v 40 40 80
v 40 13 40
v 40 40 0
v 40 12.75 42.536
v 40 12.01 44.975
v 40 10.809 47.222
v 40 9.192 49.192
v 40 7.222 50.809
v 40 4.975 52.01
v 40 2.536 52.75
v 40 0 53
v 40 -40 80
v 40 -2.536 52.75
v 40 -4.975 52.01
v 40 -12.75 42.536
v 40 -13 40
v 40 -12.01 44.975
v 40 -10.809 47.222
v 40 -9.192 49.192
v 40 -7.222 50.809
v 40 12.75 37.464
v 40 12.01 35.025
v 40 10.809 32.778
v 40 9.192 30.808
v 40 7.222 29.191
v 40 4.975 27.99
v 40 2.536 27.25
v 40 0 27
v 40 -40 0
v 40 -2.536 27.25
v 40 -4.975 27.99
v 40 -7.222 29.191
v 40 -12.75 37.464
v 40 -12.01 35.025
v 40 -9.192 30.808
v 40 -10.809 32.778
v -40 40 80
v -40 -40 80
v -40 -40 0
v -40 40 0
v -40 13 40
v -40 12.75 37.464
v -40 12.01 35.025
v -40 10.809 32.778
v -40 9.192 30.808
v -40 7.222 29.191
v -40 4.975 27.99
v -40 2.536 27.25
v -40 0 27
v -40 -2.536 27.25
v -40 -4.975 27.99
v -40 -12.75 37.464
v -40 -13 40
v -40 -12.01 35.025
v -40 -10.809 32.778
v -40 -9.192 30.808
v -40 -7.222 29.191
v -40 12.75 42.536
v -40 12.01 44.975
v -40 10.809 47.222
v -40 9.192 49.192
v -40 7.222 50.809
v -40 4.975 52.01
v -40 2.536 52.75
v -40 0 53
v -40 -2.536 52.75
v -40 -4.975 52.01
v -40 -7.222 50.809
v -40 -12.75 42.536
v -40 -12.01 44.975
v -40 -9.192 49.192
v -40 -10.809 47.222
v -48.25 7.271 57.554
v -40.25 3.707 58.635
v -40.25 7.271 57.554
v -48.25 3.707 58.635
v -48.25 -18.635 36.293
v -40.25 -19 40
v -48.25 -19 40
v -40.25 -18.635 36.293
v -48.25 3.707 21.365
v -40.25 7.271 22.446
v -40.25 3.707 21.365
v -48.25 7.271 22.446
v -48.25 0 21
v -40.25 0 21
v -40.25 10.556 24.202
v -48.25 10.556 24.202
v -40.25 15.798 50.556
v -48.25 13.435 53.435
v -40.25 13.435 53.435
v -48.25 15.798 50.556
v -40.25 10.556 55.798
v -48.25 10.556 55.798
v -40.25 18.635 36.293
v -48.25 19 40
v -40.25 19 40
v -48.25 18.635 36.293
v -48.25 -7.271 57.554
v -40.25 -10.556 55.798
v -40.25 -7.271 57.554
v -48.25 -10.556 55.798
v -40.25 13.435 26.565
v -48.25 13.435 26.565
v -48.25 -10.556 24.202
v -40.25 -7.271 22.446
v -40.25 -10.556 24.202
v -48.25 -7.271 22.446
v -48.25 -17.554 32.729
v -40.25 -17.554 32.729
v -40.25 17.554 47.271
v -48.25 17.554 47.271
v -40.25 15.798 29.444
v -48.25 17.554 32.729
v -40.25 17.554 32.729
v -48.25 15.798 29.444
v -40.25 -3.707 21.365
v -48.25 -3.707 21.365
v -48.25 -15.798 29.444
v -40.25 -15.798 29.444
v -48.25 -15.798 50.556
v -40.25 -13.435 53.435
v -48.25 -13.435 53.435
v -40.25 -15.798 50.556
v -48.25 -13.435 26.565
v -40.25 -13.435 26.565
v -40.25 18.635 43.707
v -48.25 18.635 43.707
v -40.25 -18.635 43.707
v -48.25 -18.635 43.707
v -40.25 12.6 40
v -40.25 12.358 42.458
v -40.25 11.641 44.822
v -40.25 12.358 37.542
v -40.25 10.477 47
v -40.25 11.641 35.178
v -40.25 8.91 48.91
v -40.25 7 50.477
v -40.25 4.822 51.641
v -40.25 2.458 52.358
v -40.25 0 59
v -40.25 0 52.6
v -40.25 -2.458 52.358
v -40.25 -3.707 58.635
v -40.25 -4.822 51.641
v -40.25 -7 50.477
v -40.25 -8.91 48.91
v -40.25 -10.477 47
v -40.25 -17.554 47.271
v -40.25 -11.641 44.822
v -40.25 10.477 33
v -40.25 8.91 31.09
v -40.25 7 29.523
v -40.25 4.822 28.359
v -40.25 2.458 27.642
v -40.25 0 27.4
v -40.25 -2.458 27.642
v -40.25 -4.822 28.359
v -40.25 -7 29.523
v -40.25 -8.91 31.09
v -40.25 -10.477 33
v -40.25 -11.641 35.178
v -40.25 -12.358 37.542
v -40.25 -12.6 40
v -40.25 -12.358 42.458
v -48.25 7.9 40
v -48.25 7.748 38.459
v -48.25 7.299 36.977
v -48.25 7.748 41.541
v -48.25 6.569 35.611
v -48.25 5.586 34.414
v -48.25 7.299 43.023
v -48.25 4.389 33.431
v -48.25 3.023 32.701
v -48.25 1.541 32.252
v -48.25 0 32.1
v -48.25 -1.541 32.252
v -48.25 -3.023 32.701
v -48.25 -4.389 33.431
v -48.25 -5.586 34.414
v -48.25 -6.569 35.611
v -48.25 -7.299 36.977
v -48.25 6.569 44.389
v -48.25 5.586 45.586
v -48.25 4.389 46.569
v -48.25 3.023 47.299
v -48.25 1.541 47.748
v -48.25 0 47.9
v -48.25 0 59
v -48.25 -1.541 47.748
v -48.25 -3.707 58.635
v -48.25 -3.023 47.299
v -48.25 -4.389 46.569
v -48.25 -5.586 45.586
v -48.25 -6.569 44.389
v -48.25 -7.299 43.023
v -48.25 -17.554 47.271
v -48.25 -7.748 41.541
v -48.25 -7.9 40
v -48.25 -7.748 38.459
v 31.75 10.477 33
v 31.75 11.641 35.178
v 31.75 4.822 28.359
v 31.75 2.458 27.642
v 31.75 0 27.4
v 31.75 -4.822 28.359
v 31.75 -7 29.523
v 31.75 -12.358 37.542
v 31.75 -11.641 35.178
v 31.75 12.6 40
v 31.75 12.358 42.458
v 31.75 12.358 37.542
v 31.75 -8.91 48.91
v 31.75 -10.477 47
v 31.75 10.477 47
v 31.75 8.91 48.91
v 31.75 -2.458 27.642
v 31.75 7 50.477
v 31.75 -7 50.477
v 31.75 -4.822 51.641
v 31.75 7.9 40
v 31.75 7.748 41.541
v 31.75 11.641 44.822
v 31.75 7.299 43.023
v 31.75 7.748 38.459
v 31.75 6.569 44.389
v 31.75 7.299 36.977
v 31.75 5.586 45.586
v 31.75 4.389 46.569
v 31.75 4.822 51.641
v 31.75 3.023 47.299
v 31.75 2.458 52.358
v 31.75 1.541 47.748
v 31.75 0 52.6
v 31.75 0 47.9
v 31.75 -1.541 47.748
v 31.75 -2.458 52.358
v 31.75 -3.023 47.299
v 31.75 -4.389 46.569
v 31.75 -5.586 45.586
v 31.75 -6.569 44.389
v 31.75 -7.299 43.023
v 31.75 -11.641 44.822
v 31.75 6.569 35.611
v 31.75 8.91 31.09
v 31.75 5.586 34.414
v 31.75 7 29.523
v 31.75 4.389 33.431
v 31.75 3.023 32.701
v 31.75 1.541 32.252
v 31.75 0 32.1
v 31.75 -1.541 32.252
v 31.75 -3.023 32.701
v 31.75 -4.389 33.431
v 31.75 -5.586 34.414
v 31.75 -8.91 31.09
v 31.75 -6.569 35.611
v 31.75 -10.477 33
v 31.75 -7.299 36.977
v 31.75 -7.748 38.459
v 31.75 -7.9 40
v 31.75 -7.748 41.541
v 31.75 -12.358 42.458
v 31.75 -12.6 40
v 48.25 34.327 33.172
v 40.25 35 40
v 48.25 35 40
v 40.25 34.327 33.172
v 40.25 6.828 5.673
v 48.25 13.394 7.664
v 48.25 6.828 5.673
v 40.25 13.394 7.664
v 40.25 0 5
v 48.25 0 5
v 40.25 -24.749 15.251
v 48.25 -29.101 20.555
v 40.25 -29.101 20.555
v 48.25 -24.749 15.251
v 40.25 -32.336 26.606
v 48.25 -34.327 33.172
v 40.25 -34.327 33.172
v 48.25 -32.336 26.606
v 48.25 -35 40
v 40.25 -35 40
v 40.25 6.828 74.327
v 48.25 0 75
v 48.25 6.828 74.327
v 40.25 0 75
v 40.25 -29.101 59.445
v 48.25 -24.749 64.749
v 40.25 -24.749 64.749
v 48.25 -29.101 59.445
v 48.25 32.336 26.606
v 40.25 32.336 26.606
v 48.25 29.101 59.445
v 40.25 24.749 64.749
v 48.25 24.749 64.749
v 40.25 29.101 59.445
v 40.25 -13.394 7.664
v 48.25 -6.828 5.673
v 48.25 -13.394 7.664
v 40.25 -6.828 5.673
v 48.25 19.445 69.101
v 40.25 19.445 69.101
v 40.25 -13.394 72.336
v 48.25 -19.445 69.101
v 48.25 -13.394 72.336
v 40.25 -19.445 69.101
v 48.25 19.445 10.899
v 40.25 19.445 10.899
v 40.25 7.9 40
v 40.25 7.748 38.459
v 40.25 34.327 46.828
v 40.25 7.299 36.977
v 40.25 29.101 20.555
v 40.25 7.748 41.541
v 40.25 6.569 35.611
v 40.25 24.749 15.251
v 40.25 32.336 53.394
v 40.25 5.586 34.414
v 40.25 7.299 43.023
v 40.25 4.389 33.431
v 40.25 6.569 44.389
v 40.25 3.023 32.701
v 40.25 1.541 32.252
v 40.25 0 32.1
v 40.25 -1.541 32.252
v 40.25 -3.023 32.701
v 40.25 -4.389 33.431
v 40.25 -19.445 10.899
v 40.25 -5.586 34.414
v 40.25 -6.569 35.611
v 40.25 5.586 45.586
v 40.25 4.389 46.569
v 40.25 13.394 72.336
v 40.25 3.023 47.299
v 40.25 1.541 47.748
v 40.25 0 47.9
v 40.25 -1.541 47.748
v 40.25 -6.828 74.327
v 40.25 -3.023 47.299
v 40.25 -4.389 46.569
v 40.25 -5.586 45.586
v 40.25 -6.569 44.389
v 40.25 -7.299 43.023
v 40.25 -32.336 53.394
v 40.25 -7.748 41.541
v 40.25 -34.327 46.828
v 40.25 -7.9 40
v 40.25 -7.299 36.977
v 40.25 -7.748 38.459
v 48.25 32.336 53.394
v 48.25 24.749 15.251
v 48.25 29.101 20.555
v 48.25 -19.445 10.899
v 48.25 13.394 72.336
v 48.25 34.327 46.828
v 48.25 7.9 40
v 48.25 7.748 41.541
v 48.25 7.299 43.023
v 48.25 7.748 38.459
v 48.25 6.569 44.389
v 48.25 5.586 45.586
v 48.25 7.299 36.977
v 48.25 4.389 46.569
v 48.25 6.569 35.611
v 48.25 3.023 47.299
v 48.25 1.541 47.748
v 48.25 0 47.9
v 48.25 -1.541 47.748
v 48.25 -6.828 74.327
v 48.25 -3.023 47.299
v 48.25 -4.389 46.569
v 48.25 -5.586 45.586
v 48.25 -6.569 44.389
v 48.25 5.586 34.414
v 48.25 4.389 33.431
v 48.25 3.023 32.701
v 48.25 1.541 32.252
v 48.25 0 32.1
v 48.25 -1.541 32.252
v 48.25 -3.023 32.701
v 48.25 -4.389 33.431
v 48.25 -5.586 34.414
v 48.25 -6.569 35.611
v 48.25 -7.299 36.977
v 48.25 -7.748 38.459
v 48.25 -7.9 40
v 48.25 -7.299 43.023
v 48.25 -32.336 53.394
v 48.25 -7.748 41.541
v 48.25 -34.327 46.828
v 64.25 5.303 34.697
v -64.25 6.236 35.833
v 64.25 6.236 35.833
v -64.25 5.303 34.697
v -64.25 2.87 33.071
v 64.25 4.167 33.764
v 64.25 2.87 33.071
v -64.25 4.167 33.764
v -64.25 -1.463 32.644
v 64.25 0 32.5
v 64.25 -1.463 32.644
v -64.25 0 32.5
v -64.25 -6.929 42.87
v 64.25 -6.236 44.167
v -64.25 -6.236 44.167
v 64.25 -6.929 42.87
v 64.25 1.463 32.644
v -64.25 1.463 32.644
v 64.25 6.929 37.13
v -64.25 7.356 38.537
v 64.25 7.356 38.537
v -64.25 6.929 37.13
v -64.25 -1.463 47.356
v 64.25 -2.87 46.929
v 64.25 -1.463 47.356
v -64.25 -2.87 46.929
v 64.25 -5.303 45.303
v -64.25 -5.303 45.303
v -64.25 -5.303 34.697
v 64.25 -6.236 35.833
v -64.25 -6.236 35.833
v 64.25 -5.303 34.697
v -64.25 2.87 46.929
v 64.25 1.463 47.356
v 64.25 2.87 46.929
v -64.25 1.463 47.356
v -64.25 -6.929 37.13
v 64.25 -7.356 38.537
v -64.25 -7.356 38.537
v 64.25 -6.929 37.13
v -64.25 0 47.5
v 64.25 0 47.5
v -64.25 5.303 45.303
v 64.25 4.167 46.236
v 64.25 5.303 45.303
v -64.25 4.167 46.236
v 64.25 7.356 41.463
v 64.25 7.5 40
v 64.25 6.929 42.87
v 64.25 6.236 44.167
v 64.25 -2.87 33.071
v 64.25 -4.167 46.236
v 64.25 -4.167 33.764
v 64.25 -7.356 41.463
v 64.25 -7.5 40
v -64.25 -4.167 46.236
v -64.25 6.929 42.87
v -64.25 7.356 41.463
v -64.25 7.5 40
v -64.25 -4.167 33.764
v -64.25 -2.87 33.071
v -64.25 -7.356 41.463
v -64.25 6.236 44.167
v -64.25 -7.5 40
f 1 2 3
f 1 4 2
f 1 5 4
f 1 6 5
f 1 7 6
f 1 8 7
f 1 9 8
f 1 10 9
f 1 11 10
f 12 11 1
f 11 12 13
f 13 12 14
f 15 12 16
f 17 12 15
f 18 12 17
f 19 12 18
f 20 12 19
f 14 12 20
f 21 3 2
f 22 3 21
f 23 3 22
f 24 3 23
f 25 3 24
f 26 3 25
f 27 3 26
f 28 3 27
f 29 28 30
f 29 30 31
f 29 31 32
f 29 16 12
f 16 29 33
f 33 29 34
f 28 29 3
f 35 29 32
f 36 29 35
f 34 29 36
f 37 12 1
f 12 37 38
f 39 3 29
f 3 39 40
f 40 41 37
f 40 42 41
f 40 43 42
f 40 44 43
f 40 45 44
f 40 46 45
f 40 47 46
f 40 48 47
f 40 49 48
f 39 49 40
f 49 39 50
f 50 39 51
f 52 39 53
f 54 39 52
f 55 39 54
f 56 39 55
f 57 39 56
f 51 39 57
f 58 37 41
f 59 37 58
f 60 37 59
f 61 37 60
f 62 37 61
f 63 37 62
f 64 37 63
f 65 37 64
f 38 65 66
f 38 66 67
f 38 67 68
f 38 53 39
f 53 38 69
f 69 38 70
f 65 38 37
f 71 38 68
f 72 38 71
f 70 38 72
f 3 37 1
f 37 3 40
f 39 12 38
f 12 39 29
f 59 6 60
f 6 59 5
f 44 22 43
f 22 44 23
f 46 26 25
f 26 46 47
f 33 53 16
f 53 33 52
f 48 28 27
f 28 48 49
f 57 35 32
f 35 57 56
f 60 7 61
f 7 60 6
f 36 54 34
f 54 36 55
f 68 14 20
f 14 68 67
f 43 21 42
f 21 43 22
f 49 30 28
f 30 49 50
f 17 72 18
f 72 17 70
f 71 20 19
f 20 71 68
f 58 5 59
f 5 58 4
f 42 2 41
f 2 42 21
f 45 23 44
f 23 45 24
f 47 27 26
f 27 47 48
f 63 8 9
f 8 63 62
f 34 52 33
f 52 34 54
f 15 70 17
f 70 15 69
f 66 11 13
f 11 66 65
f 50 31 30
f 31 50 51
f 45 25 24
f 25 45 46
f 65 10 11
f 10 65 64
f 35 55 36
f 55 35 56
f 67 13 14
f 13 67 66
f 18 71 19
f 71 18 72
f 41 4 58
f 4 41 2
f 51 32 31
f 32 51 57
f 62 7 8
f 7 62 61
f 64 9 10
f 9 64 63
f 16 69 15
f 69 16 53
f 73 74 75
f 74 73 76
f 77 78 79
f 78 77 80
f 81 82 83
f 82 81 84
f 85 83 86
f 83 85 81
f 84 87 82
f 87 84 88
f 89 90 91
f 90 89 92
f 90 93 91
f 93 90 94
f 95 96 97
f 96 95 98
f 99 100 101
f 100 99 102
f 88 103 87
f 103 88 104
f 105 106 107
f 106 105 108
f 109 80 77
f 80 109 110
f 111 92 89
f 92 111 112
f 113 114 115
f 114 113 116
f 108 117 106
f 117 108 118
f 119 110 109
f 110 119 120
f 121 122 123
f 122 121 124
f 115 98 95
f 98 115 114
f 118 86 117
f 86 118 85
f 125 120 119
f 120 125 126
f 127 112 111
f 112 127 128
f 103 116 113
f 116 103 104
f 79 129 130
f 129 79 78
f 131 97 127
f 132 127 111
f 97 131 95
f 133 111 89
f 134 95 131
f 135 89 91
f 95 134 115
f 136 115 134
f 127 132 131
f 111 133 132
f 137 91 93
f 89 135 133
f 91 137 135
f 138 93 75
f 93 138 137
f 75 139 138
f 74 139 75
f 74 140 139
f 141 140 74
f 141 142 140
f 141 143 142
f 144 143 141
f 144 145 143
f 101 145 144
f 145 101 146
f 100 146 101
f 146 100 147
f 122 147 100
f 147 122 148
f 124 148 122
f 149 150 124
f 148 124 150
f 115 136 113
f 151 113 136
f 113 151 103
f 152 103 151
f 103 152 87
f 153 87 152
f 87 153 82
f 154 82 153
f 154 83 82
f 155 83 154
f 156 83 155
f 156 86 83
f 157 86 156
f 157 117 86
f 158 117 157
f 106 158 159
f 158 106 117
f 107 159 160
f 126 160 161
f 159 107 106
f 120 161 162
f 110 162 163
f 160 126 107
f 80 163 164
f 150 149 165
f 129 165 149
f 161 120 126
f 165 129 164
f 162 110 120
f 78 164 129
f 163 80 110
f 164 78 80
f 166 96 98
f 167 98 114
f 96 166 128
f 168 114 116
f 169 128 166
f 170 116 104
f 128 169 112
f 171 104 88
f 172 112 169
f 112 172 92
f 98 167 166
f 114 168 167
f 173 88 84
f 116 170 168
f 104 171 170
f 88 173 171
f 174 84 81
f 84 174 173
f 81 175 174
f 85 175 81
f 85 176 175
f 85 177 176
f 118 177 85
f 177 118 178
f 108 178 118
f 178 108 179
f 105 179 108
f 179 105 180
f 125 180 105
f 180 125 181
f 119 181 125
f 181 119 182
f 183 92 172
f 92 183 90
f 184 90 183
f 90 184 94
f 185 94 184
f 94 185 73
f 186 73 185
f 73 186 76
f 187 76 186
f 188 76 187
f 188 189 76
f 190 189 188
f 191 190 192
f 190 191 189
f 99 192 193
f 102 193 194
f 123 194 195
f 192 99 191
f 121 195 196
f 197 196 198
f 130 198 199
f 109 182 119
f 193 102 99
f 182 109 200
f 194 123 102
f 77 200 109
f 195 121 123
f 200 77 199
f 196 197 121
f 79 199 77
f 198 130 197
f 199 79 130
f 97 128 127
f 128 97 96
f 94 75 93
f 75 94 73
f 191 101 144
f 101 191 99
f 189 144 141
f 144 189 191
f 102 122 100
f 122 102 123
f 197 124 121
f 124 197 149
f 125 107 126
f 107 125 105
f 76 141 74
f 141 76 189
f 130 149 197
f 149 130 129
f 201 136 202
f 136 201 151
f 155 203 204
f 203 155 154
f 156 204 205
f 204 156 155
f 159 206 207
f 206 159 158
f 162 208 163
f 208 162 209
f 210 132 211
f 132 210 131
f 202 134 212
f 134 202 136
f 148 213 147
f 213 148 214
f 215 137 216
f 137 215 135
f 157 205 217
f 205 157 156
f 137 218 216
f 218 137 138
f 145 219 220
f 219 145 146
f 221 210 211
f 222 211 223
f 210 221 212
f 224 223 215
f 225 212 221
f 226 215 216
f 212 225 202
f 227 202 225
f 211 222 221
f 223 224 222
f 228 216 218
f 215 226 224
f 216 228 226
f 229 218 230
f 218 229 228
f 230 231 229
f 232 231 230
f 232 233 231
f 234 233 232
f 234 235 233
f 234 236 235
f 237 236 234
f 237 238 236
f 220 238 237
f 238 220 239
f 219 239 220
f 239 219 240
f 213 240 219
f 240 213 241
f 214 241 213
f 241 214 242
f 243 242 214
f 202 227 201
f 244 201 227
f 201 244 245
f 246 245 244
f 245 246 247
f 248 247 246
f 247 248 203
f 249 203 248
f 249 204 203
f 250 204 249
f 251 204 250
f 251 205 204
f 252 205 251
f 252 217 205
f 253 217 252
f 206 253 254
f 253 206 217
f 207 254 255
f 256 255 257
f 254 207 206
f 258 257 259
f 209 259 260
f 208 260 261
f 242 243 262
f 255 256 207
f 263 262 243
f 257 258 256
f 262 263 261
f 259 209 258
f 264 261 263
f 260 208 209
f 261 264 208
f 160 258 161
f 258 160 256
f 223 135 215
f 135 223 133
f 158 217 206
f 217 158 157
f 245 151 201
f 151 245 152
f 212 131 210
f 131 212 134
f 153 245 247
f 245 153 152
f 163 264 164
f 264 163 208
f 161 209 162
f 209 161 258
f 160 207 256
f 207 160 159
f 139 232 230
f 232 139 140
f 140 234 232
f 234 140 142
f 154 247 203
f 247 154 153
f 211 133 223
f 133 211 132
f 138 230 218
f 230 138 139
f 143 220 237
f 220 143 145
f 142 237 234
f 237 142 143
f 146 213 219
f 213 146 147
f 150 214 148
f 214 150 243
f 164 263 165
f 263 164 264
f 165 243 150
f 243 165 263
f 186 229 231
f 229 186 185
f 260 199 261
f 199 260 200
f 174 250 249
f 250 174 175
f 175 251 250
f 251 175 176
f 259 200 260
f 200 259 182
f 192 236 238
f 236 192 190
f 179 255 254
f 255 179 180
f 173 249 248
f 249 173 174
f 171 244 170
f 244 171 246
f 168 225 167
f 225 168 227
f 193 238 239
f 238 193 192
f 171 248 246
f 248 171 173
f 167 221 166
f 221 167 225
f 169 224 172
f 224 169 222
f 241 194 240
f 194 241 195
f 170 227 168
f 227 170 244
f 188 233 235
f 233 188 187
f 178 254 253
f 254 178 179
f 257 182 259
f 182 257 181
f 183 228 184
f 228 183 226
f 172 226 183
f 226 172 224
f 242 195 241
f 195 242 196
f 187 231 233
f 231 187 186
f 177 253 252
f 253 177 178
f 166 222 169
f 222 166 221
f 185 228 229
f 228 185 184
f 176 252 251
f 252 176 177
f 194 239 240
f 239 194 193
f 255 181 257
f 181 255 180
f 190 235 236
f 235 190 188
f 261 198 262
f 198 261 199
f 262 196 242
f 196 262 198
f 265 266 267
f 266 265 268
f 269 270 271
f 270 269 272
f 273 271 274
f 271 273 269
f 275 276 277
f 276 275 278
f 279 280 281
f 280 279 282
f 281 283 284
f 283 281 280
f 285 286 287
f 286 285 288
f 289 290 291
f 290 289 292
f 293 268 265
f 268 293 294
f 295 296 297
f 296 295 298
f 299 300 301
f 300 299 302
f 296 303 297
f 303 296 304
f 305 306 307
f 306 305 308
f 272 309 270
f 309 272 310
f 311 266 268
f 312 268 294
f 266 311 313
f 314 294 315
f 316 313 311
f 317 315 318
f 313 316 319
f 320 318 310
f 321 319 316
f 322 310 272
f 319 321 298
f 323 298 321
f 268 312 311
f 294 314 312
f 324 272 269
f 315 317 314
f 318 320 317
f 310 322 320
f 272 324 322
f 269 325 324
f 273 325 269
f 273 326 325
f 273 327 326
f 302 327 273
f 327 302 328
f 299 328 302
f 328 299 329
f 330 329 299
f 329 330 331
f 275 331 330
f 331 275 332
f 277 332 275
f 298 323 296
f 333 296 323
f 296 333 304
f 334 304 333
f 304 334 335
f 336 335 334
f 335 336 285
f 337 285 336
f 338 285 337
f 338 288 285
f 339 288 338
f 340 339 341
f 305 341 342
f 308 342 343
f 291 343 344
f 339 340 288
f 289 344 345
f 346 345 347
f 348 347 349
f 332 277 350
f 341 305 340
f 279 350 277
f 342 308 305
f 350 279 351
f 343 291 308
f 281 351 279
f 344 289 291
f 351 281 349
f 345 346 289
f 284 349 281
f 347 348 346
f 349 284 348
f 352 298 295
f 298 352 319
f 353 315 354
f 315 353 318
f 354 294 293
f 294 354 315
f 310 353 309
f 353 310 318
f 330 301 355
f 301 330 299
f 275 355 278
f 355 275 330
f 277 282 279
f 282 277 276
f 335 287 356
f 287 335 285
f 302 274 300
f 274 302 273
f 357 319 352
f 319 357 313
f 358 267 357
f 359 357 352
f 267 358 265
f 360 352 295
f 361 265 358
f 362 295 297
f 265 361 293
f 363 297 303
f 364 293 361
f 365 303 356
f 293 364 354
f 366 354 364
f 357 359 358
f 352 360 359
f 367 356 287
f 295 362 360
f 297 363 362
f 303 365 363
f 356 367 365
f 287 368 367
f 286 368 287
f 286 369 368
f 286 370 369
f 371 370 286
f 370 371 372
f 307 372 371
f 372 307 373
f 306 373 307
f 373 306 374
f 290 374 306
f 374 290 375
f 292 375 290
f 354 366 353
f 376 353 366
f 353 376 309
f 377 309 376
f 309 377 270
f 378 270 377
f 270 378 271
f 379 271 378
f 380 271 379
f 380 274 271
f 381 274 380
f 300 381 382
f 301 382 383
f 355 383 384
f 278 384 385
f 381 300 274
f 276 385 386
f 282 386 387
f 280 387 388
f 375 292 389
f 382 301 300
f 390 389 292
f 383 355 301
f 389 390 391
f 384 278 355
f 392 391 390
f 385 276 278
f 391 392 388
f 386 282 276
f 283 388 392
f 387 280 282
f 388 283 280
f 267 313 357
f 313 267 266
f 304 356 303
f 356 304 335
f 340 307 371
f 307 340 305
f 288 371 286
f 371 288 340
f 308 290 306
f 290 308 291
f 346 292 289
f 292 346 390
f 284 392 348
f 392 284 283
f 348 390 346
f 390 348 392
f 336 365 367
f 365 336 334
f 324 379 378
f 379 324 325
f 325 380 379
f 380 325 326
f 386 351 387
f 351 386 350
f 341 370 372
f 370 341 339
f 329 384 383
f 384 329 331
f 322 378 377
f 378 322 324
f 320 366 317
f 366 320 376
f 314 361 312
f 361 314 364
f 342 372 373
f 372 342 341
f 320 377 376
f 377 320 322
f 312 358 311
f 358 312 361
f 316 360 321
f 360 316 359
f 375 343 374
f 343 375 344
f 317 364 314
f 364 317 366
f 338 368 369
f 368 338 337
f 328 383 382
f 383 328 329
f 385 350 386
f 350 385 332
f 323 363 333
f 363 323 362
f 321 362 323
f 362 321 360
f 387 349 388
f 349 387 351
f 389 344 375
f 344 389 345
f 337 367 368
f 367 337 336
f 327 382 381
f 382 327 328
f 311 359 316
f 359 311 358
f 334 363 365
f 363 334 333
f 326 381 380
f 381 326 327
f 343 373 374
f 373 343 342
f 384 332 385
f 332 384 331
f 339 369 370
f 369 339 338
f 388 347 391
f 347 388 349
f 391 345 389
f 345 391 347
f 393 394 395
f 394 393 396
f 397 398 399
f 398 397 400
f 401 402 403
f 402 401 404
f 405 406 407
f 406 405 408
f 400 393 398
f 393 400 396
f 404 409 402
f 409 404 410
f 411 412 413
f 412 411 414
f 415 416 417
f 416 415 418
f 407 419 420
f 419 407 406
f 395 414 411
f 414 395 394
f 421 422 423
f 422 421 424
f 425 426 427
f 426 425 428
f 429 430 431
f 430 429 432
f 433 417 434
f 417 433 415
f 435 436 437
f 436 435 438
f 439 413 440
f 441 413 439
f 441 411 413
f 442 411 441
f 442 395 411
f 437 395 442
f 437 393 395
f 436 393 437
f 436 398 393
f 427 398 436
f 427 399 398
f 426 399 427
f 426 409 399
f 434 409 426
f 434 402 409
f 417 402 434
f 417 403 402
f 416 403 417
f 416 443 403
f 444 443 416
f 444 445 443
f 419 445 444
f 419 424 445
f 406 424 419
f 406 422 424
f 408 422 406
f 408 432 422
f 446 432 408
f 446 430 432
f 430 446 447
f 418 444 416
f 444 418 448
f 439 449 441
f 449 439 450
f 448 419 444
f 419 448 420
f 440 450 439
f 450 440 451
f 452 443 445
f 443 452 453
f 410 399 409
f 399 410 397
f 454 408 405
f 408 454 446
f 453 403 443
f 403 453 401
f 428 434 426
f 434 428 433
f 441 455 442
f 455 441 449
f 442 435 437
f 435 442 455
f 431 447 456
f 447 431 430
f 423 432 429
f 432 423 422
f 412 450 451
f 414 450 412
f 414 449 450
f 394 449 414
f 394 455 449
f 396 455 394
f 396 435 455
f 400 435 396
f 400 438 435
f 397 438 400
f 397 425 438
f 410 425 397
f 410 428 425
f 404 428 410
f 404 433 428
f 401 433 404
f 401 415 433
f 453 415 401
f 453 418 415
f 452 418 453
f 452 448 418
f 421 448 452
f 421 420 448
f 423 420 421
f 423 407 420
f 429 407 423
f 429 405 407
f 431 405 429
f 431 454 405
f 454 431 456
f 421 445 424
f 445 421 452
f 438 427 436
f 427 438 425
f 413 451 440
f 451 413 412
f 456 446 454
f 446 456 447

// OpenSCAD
$fn = 32;

// ------------------------------------------------------------------------
// Bushed housing: 80 x 80 x 80 mm housing, bushing d25.2
// Every part is its own module, assembly() places them once.
// ------------------------------------------------------------------------

// --- part 1 ---
module housing() {
  difference() {
    translate([-40, -40, 0]) cube([80, 80, 80]);
    translate([0, 0, 40]) rotate([0, 90, 0]) cylinder(h = 82, d = 26, center = true);
  }
}

// --- part 2 ---
module bushing() {
  difference() {
    union() {
      cylinder(h = 8, d = 38);
      translate([0, 0, 8]) cylinder(h = 72, d = 25.2);
    }
    translate([0, 0, -1]) cylinder(h = 82, d = 15.8);
  }
}

// --- part 3 ---
module shaft() {
  translate([0, 0, -64.25]) cylinder(h = 128.5, d = 15);
}

// --- part 4 ---
module cover() {
  difference() {
    cylinder(h = 8, d = 70);
    translate([0, 0, -1]) cylinder(h = 10, d = 15.8);
  }
}

// --- assembly ---
module assembly() {
  translate([0, 0, 0]) rotate([0, 0, 0]) housing();
  translate([-48.25, 0, 40]) rotate([0, 90, 0]) bushing();
  translate([0, 0, 40]) rotate([0, 90, 0]) shaft();
  translate([40.25, 0, 40]) rotate([0, 90, 0]) cover();
}

assembly();
